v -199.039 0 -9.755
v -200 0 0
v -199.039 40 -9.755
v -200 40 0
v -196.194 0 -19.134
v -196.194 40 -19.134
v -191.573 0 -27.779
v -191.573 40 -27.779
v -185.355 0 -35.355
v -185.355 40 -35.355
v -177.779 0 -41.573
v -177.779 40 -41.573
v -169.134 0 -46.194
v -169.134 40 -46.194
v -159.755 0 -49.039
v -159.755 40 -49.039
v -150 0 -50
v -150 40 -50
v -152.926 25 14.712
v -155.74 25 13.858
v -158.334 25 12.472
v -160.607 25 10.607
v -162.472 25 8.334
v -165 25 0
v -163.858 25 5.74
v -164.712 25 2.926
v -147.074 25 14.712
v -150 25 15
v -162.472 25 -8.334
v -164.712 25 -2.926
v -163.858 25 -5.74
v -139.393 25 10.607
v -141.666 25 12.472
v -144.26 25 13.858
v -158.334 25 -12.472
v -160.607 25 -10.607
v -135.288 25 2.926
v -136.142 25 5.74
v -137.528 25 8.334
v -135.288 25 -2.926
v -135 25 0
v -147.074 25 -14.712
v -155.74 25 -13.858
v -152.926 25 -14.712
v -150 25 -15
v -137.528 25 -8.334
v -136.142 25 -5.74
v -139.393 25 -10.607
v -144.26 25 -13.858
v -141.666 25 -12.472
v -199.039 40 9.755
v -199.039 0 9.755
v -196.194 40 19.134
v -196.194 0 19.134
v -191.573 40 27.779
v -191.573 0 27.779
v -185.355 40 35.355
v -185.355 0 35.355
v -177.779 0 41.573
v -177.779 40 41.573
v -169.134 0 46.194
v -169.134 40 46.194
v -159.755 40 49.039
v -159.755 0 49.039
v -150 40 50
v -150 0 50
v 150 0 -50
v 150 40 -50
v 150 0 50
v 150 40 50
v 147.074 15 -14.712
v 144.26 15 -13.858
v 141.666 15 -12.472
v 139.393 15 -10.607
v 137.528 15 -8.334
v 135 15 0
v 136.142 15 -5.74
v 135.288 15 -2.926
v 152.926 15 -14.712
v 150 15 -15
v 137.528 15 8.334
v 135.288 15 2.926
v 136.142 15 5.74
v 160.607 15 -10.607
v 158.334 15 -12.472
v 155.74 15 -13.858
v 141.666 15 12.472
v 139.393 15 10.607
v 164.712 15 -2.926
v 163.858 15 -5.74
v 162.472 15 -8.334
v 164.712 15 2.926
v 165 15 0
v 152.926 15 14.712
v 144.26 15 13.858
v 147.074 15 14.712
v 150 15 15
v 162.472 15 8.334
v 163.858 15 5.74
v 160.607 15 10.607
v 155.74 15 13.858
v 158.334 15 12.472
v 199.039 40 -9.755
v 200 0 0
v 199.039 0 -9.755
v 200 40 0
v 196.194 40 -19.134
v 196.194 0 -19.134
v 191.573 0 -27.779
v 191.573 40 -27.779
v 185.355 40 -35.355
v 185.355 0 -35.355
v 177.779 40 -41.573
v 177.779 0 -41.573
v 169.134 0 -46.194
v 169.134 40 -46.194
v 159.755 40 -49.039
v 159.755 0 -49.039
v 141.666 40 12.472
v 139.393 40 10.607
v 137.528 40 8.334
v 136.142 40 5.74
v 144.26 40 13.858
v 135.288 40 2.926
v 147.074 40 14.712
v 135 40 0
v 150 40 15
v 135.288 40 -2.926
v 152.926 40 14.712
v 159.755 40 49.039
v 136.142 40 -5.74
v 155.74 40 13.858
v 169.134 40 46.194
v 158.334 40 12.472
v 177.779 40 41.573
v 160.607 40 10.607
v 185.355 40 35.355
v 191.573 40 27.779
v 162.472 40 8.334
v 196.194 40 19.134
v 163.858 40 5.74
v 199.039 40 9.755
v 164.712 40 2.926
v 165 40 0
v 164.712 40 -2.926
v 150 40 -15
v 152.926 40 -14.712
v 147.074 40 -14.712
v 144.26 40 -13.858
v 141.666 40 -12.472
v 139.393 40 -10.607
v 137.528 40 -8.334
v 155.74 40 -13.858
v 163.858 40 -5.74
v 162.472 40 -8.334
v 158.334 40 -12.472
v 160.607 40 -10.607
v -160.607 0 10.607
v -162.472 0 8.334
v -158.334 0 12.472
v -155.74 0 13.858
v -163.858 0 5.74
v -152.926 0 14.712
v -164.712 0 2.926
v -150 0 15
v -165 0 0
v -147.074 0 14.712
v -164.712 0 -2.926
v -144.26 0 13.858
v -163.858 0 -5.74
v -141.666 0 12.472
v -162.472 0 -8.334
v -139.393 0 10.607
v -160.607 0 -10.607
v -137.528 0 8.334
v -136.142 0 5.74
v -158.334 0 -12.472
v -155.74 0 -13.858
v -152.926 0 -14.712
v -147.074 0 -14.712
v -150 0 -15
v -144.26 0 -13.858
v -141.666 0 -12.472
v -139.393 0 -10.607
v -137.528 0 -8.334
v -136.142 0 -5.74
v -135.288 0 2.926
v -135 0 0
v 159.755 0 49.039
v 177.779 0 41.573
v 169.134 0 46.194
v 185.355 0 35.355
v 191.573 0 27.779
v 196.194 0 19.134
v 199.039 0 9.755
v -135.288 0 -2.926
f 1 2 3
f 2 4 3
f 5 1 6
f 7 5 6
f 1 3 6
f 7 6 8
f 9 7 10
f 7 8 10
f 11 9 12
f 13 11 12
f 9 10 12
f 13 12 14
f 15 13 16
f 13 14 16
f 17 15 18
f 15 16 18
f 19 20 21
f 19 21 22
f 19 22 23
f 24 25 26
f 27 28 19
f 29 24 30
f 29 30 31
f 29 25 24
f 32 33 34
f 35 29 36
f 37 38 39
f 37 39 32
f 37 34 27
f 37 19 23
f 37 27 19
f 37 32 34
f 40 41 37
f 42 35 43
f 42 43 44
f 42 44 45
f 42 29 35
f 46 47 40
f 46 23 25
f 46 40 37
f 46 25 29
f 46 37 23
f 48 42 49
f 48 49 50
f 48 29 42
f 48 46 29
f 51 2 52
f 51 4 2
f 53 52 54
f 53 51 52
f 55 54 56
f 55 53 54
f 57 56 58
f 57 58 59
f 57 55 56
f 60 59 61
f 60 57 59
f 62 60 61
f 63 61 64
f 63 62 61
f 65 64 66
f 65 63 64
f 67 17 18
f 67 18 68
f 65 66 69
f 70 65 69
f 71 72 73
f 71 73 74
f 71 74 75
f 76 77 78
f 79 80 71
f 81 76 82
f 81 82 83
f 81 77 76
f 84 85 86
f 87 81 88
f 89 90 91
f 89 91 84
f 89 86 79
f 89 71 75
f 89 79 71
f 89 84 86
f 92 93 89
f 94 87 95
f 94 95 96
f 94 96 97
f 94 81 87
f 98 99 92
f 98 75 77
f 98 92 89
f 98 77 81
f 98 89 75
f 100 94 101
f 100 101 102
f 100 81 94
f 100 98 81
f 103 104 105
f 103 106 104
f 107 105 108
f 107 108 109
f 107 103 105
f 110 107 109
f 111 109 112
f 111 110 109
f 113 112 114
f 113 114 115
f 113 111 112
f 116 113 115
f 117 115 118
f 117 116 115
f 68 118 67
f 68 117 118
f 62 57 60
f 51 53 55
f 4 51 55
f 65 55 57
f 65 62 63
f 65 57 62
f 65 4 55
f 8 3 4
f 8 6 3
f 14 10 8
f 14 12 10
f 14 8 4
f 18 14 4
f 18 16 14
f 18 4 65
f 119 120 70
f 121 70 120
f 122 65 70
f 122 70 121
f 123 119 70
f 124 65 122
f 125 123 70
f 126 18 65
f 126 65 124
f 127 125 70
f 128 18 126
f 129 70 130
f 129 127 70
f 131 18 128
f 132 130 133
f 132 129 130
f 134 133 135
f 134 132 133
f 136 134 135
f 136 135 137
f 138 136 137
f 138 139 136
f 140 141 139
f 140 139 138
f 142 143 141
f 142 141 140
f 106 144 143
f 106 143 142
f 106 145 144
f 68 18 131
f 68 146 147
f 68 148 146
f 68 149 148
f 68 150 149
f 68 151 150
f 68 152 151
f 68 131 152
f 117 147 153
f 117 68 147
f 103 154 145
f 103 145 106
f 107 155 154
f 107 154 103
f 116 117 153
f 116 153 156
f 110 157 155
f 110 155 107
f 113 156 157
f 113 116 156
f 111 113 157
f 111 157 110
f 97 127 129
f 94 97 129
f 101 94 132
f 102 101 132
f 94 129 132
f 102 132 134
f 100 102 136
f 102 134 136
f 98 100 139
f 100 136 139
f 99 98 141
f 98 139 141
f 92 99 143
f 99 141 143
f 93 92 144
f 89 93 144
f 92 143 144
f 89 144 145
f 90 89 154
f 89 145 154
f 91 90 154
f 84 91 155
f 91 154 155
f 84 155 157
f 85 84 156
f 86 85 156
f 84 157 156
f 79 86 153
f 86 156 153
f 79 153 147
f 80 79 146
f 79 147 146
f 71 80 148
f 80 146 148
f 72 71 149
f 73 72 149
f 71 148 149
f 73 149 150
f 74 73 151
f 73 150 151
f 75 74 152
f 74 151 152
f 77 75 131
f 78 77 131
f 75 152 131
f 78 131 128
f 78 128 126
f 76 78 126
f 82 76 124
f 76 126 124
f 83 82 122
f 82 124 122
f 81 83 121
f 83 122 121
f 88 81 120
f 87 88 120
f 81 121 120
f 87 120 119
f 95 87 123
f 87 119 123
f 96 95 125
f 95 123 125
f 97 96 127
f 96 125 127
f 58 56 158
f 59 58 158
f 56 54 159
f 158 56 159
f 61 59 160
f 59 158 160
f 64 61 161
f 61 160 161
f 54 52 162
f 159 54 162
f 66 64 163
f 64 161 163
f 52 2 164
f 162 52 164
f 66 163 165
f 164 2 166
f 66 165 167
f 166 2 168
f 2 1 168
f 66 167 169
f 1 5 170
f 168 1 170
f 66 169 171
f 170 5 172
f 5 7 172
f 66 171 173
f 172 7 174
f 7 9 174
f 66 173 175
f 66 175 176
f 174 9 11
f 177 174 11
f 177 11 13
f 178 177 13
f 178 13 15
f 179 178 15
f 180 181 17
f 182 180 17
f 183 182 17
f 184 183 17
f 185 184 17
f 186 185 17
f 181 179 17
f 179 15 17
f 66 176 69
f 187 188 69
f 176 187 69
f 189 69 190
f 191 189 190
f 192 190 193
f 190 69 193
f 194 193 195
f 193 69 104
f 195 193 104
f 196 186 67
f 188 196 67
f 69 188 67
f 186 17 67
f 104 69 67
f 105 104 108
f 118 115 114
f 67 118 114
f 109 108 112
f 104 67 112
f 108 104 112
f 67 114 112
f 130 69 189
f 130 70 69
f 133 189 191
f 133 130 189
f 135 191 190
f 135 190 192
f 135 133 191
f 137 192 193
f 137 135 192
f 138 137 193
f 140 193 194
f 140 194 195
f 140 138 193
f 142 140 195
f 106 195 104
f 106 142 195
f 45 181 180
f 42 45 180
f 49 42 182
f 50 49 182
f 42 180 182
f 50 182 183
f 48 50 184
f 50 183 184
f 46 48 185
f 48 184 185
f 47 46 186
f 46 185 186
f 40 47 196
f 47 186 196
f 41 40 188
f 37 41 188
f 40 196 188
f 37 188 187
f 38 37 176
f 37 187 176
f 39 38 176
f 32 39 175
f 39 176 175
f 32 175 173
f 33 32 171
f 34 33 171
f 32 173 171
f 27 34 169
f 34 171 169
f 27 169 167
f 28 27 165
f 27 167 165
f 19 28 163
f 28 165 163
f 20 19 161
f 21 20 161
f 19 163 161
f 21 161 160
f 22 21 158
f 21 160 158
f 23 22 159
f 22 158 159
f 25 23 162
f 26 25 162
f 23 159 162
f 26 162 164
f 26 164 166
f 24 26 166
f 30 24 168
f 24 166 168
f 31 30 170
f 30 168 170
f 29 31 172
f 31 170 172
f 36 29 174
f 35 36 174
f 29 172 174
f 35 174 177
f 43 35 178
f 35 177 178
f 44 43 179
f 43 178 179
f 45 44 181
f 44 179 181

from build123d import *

# Parameters (mm, degrees)
ESBO_O2_W                = 400
ESBO_O2_H                = 100
RESSALTO_EXTRUS_O1_DEPTH = 40
FILETE1_R                = 50
ESBO_O5_R                = 15
CORTE_EXTRUS_O1_DEPTH    = 25
ESBO_O3_R                = 15
CORTE_EXTRUS_O2_DEPTH    = 25


with BuildPart() as part:
    # Esboço2 → Ressalto-extrusão1 (new body)
    with BuildSketch(Plane(origin=(0, 0, 0), x_dir=(1, 0, 0), z_dir=(0, 1, 0))):
        Rectangle(ESBO_O2_W, ESBO_O2_H)
    extrude(amount=RESSALTO_EXTRUS_O1_DEPTH)

    # Filete1
    filete1_edges = [part.edges().sort_by_distance(p)[0] for p in [
        (-200, 20, -50),
        (-200, 20, 50),
        (200, 20, -50),
        (200, 20, 50),
    ]]
    fillet(filete1_edges, radius=FILETE1_R - 0.0001)  # a hair under: the kernel refuses the full size

    # Esboço5 → Corte-extrusão1 (cut)
    with BuildSketch(Plane.XZ):
        with Locations(Location((-150, 0, 0), (0, 0, 270))):
            Circle(ESBO_O5_R)
    extrude(amount=-CORTE_EXTRUS_O1_DEPTH, mode=Mode.SUBTRACT)

    # Esboço3 → Corte-extrusão2 (cut)
    with BuildSketch(Plane(origin=(0, 40, 0), x_dir=(1, 0, 0), z_dir=(0, 1, 0))):
        with Locations(Location((150, 0, 0), (0, 0, 270))):
            Circle(ESBO_O3_R)
    extrude(amount=-CORTE_EXTRUS_O2_DEPTH, mode=Mode.SUBTRACT)


solid = part.part
